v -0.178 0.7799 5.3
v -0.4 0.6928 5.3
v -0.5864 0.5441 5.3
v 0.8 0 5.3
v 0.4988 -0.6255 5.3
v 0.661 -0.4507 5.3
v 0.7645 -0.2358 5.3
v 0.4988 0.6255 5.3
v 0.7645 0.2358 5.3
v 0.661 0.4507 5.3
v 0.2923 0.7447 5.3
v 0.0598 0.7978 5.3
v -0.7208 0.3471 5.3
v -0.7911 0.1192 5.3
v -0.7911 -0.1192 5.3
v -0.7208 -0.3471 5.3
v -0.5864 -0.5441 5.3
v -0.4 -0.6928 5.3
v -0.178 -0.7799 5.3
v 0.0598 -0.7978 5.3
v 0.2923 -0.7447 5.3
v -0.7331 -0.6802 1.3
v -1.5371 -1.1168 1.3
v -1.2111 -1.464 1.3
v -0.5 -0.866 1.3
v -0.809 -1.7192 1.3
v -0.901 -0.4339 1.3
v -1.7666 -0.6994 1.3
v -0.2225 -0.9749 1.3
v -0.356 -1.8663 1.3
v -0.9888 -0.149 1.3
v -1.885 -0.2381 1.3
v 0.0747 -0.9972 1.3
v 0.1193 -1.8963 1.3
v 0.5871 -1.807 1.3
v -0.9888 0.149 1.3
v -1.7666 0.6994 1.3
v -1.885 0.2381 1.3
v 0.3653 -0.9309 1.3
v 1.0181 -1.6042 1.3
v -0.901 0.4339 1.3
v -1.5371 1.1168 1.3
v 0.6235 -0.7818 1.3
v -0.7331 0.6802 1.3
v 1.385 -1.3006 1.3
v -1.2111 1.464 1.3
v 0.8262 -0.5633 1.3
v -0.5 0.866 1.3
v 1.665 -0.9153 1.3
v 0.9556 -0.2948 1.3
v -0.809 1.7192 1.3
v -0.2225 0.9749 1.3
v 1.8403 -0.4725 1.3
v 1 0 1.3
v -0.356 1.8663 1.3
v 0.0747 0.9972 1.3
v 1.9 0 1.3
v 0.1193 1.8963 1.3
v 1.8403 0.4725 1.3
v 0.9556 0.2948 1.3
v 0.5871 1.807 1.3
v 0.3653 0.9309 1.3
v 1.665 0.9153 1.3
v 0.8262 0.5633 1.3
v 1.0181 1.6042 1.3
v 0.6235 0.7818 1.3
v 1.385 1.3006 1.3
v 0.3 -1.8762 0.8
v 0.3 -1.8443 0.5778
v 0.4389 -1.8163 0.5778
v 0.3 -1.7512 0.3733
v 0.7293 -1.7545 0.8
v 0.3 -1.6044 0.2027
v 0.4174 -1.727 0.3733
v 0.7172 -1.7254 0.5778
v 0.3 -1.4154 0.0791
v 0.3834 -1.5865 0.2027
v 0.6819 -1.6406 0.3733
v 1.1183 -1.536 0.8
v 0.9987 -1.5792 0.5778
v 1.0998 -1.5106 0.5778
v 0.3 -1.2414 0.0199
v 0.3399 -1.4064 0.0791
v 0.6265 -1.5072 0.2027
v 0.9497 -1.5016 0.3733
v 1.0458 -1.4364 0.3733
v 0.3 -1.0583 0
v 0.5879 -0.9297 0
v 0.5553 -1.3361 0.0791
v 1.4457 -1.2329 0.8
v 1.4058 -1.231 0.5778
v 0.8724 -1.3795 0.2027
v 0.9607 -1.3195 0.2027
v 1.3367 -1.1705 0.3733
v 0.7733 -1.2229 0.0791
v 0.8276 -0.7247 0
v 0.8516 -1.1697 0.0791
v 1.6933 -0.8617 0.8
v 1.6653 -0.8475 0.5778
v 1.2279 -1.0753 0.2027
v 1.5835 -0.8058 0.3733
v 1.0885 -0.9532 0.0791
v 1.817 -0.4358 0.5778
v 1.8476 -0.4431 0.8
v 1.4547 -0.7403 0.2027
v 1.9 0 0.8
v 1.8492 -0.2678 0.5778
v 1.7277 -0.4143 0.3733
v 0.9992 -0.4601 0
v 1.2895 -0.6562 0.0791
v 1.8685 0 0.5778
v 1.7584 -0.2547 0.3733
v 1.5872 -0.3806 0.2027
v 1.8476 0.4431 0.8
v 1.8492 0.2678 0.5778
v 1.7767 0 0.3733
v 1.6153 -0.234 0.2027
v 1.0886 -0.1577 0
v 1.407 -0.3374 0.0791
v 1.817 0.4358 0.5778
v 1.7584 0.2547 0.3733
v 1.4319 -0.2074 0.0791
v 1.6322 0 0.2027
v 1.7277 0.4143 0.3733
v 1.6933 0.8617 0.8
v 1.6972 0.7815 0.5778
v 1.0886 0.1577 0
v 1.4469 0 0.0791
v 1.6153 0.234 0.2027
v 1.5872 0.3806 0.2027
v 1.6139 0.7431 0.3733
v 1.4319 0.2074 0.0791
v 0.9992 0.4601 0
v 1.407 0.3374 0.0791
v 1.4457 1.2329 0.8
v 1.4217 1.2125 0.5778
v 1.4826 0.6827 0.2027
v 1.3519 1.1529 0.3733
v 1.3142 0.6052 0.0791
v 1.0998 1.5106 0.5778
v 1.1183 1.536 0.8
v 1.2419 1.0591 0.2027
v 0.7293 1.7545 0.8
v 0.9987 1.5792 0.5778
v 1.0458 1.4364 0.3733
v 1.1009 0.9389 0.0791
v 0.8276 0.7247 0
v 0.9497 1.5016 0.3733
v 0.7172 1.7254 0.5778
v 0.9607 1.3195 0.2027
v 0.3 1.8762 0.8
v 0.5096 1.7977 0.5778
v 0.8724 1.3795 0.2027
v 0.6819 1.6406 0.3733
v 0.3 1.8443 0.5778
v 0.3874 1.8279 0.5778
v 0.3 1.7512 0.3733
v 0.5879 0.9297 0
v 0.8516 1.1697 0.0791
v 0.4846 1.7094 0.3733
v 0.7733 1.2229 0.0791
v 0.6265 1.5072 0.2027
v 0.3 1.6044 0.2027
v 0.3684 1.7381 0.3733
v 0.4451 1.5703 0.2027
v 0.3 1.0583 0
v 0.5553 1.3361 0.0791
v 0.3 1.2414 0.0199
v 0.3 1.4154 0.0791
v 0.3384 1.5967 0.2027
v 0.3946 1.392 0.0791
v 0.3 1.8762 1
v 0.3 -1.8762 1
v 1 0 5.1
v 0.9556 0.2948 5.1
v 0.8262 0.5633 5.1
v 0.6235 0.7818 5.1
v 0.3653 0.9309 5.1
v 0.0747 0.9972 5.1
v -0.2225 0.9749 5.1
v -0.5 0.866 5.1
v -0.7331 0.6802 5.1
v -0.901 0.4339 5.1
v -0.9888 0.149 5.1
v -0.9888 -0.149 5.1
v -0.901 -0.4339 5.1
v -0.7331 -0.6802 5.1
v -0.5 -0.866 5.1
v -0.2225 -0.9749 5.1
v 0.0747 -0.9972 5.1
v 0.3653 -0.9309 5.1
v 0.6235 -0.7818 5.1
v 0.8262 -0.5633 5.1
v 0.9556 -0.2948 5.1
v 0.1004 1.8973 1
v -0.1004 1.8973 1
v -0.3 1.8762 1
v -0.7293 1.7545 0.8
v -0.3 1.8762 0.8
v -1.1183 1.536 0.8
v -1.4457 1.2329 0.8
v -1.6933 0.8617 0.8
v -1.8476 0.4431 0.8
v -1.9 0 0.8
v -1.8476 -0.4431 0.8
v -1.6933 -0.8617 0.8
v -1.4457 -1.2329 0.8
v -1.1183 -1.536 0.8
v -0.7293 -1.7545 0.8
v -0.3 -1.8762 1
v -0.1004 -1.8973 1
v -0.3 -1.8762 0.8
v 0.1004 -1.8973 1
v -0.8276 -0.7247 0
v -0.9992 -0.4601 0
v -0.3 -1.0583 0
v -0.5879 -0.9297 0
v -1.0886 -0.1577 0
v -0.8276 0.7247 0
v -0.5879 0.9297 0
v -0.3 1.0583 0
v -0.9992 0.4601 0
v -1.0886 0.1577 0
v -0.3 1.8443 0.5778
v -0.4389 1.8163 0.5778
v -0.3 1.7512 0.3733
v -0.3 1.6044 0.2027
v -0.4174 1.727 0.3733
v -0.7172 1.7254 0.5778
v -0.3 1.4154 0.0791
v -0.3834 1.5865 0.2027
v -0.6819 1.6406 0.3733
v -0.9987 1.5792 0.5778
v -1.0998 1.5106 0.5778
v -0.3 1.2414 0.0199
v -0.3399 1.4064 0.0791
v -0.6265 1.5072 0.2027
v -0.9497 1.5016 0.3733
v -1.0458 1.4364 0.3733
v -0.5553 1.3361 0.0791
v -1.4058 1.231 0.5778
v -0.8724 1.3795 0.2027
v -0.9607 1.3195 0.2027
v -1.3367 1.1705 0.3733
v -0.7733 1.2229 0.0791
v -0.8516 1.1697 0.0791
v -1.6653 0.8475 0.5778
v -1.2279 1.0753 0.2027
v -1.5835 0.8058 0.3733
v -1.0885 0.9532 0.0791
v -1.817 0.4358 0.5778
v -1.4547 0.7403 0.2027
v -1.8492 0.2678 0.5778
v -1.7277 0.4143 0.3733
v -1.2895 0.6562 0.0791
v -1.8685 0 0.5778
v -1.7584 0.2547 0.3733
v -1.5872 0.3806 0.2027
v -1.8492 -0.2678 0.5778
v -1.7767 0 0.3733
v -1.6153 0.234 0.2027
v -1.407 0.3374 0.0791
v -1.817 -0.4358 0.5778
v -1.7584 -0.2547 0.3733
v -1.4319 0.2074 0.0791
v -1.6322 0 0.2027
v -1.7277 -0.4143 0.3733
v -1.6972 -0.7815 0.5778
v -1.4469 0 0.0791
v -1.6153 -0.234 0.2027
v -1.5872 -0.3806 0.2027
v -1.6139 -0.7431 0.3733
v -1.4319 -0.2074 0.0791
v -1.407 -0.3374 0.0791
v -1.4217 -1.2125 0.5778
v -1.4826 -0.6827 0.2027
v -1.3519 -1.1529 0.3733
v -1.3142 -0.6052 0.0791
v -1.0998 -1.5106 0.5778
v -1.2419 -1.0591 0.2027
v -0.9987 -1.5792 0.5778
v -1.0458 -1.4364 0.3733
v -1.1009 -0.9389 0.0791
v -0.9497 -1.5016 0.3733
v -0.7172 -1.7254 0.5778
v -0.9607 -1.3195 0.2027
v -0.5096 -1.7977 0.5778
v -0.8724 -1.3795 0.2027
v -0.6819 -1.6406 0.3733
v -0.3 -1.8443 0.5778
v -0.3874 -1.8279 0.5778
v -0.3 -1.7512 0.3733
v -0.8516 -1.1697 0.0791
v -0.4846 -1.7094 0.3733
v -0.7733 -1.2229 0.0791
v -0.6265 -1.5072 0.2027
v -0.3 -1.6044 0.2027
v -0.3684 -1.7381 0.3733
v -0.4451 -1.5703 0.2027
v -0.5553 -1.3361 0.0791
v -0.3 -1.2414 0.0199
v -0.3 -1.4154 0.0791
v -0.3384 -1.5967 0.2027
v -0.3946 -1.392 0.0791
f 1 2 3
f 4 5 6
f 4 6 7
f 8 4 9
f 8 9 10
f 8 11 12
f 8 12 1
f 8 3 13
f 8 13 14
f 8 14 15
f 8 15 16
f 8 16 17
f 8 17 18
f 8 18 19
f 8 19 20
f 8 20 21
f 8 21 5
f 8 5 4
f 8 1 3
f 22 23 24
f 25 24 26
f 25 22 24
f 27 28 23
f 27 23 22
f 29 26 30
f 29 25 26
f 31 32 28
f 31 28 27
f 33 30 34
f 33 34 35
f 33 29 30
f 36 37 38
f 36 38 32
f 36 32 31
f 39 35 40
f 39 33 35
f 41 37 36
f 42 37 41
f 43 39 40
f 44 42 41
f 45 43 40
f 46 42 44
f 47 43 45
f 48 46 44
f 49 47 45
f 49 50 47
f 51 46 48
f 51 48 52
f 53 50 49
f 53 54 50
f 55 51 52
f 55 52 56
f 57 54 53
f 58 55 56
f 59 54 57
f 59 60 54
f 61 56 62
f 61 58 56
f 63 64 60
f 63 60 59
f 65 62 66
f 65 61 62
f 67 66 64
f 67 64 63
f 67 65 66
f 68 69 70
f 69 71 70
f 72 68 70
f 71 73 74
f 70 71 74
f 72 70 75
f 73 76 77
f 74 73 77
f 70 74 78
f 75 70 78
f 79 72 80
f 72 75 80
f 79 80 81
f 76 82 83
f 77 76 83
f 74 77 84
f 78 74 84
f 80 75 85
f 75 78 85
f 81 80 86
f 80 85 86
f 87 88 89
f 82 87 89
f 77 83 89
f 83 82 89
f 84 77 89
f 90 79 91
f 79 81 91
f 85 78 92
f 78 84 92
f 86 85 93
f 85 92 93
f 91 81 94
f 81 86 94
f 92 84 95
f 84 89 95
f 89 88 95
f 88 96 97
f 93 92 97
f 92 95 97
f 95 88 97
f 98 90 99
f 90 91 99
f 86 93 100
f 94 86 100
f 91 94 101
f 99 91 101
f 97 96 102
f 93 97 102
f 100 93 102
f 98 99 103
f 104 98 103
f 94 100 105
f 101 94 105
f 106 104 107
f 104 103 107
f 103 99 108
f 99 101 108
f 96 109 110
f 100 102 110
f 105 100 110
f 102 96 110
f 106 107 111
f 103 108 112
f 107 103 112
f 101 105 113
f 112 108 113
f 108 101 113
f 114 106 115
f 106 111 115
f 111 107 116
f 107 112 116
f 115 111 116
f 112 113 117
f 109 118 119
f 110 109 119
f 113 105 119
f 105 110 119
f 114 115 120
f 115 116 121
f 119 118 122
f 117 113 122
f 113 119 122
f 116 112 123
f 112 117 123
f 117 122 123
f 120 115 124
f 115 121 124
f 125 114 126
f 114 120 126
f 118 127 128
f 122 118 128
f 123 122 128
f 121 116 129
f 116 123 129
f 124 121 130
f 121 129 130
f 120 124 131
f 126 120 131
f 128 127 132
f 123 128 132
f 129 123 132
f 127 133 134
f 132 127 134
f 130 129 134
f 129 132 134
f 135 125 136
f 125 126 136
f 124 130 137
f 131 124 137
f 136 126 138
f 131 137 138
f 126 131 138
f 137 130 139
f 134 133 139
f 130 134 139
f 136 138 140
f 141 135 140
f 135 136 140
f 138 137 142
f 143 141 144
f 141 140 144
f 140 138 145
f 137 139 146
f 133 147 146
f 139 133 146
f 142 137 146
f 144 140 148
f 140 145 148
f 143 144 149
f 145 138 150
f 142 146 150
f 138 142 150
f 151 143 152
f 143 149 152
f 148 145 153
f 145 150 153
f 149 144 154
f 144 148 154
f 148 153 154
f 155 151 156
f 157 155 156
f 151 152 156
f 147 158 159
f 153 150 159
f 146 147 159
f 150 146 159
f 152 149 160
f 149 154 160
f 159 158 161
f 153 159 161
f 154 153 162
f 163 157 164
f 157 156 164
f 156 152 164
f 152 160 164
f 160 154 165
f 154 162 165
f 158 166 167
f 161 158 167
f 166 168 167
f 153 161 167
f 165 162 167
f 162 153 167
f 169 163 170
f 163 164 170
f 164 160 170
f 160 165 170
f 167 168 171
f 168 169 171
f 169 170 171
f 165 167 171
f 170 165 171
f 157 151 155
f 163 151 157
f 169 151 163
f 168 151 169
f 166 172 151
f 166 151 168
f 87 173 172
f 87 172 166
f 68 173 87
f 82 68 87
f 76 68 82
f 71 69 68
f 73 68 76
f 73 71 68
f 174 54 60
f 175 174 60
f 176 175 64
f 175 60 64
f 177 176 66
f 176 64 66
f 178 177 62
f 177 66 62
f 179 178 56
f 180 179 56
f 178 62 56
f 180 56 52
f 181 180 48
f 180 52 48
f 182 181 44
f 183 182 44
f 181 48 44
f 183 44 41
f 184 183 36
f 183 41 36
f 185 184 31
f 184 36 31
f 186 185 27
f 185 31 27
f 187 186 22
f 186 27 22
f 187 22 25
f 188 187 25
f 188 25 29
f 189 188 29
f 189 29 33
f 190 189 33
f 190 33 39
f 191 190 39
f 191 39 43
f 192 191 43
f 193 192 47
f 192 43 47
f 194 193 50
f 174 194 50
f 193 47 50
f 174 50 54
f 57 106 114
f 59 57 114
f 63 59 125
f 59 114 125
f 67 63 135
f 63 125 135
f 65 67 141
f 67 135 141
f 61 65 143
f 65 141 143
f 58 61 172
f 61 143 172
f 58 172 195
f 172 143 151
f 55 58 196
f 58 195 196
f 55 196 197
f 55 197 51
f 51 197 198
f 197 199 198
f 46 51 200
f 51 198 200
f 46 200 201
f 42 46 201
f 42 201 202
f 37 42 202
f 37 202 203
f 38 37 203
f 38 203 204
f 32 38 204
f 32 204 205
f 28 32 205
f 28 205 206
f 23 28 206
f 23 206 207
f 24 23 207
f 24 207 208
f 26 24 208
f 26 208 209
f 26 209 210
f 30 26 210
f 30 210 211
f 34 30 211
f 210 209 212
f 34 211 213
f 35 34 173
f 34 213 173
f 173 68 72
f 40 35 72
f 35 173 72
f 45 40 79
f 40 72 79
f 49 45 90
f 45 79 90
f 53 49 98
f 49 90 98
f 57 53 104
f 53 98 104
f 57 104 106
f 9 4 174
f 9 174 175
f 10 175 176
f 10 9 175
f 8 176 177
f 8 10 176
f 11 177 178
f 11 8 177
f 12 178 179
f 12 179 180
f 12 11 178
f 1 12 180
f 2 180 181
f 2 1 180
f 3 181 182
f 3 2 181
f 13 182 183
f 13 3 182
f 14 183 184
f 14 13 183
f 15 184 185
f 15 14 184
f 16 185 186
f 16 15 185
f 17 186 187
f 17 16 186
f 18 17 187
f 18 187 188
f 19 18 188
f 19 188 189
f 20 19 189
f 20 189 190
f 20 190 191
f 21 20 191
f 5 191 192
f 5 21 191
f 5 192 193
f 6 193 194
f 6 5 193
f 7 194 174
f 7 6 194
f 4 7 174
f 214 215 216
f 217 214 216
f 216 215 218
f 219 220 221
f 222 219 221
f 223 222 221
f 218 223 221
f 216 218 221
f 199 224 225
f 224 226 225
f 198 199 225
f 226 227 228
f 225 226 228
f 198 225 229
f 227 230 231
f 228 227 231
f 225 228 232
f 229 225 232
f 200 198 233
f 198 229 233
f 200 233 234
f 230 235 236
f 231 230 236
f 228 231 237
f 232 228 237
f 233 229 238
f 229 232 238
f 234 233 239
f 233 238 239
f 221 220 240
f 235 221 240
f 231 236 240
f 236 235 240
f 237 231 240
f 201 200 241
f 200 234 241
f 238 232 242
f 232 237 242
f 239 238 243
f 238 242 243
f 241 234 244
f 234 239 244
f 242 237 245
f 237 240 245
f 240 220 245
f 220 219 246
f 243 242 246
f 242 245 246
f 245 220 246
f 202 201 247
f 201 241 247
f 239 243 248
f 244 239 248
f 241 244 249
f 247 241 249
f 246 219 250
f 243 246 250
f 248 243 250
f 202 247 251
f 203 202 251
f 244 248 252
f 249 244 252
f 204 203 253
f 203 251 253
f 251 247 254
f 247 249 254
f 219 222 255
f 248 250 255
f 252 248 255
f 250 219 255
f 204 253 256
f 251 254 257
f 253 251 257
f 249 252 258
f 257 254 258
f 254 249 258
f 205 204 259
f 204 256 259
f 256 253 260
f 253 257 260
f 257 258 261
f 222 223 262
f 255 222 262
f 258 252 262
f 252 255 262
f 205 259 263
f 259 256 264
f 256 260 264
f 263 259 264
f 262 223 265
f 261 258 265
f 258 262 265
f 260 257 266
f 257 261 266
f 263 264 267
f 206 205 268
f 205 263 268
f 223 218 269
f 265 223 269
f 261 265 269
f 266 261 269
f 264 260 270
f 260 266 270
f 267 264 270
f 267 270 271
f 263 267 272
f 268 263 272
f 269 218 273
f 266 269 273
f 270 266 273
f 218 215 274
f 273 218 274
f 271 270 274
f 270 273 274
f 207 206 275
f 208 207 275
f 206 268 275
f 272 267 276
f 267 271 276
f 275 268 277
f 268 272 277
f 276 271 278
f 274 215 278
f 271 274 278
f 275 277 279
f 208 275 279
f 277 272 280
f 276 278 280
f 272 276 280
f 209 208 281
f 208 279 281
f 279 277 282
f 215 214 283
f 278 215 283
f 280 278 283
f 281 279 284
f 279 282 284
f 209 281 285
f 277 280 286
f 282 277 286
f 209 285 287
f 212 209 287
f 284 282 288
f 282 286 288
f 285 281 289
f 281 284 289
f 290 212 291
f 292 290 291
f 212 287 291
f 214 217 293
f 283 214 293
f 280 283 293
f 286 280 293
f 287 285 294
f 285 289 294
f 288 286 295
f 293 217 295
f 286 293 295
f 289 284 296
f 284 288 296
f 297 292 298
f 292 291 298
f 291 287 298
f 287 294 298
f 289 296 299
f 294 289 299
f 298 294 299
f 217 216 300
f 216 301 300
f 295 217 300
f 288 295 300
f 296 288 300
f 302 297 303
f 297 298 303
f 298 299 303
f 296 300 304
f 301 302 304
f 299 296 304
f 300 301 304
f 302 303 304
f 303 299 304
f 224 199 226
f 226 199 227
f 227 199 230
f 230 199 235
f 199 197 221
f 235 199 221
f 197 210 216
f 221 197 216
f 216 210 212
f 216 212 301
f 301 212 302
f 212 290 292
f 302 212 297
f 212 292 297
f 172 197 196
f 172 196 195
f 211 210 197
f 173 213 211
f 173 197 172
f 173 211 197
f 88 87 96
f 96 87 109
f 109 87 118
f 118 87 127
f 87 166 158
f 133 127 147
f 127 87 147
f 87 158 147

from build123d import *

# Parameters (mm, degrees)
ESQUISSE1_R                  = 1.9
BASE_EXTRUSION_DEPTH         = 1.3
CONG_1_R                     = 0.8
ESQUISSE2_R                  = 1
BOSS_EXTRU_1_DEPTH           = 4
CHANFREIN1_SIZE              = 0.2
ESQUISSE3_W                  = 0.6
ESQUISSE3_H                  = 1
ENL_V_MAT_EXTRU_1_DEPTH      = 2.9
ENL_V_MAT_EXTRU_1_DEPTH_BACK = 2.9


with BuildPart() as part:
    # Esquisse1 → Base-Extrusion (new body)
    with BuildSketch(Plane.XY):
        Circle(ESQUISSE1_R)
    extrude(amount=BASE_EXTRUSION_DEPTH)

    # Cong_1
    cong_1_edges = [part.edges().sort_by_distance(p)[0] for p in [
        (-1.9, 0, 0),
    ]]
    fillet(cong_1_edges, radius=CONG_1_R)

    # Esquisse2 → Boss.-Extru.1 (add)
    with BuildSketch(Plane.XY.offset(1.3)):
        Circle(ESQUISSE2_R)
    extrude(amount=BOSS_EXTRU_1_DEPTH)

    # Chanfrein1
    chanfrein1_edges = [part.edges().sort_by_distance(p)[0] for p in [
        (-1, 0, 5.3),
    ]]
    chamfer(chanfrein1_edges, length=CHANFREIN1_SIZE)

    # Esquisse3 → Enl_v. mat.-Extru.1 (cut, two sides)
    with BuildSketch(Plane(origin=(0, 0, 0), x_dir=(1, 0, 0), z_dir=(0, 1, 0))) as enl_v_mat_extru_1_sk:
        with Locations((0, -0.5)):
            Rectangle(ESQUISSE3_W, ESQUISSE3_H)
    extrude(amount=ENL_V_MAT_EXTRU_1_DEPTH, mode=Mode.SUBTRACT)
    extrude(enl_v_mat_extru_1_sk.sketch, amount=-ENL_V_MAT_EXTRU_1_DEPTH_BACK, mode=Mode.SUBTRACT)


solid = part.part
